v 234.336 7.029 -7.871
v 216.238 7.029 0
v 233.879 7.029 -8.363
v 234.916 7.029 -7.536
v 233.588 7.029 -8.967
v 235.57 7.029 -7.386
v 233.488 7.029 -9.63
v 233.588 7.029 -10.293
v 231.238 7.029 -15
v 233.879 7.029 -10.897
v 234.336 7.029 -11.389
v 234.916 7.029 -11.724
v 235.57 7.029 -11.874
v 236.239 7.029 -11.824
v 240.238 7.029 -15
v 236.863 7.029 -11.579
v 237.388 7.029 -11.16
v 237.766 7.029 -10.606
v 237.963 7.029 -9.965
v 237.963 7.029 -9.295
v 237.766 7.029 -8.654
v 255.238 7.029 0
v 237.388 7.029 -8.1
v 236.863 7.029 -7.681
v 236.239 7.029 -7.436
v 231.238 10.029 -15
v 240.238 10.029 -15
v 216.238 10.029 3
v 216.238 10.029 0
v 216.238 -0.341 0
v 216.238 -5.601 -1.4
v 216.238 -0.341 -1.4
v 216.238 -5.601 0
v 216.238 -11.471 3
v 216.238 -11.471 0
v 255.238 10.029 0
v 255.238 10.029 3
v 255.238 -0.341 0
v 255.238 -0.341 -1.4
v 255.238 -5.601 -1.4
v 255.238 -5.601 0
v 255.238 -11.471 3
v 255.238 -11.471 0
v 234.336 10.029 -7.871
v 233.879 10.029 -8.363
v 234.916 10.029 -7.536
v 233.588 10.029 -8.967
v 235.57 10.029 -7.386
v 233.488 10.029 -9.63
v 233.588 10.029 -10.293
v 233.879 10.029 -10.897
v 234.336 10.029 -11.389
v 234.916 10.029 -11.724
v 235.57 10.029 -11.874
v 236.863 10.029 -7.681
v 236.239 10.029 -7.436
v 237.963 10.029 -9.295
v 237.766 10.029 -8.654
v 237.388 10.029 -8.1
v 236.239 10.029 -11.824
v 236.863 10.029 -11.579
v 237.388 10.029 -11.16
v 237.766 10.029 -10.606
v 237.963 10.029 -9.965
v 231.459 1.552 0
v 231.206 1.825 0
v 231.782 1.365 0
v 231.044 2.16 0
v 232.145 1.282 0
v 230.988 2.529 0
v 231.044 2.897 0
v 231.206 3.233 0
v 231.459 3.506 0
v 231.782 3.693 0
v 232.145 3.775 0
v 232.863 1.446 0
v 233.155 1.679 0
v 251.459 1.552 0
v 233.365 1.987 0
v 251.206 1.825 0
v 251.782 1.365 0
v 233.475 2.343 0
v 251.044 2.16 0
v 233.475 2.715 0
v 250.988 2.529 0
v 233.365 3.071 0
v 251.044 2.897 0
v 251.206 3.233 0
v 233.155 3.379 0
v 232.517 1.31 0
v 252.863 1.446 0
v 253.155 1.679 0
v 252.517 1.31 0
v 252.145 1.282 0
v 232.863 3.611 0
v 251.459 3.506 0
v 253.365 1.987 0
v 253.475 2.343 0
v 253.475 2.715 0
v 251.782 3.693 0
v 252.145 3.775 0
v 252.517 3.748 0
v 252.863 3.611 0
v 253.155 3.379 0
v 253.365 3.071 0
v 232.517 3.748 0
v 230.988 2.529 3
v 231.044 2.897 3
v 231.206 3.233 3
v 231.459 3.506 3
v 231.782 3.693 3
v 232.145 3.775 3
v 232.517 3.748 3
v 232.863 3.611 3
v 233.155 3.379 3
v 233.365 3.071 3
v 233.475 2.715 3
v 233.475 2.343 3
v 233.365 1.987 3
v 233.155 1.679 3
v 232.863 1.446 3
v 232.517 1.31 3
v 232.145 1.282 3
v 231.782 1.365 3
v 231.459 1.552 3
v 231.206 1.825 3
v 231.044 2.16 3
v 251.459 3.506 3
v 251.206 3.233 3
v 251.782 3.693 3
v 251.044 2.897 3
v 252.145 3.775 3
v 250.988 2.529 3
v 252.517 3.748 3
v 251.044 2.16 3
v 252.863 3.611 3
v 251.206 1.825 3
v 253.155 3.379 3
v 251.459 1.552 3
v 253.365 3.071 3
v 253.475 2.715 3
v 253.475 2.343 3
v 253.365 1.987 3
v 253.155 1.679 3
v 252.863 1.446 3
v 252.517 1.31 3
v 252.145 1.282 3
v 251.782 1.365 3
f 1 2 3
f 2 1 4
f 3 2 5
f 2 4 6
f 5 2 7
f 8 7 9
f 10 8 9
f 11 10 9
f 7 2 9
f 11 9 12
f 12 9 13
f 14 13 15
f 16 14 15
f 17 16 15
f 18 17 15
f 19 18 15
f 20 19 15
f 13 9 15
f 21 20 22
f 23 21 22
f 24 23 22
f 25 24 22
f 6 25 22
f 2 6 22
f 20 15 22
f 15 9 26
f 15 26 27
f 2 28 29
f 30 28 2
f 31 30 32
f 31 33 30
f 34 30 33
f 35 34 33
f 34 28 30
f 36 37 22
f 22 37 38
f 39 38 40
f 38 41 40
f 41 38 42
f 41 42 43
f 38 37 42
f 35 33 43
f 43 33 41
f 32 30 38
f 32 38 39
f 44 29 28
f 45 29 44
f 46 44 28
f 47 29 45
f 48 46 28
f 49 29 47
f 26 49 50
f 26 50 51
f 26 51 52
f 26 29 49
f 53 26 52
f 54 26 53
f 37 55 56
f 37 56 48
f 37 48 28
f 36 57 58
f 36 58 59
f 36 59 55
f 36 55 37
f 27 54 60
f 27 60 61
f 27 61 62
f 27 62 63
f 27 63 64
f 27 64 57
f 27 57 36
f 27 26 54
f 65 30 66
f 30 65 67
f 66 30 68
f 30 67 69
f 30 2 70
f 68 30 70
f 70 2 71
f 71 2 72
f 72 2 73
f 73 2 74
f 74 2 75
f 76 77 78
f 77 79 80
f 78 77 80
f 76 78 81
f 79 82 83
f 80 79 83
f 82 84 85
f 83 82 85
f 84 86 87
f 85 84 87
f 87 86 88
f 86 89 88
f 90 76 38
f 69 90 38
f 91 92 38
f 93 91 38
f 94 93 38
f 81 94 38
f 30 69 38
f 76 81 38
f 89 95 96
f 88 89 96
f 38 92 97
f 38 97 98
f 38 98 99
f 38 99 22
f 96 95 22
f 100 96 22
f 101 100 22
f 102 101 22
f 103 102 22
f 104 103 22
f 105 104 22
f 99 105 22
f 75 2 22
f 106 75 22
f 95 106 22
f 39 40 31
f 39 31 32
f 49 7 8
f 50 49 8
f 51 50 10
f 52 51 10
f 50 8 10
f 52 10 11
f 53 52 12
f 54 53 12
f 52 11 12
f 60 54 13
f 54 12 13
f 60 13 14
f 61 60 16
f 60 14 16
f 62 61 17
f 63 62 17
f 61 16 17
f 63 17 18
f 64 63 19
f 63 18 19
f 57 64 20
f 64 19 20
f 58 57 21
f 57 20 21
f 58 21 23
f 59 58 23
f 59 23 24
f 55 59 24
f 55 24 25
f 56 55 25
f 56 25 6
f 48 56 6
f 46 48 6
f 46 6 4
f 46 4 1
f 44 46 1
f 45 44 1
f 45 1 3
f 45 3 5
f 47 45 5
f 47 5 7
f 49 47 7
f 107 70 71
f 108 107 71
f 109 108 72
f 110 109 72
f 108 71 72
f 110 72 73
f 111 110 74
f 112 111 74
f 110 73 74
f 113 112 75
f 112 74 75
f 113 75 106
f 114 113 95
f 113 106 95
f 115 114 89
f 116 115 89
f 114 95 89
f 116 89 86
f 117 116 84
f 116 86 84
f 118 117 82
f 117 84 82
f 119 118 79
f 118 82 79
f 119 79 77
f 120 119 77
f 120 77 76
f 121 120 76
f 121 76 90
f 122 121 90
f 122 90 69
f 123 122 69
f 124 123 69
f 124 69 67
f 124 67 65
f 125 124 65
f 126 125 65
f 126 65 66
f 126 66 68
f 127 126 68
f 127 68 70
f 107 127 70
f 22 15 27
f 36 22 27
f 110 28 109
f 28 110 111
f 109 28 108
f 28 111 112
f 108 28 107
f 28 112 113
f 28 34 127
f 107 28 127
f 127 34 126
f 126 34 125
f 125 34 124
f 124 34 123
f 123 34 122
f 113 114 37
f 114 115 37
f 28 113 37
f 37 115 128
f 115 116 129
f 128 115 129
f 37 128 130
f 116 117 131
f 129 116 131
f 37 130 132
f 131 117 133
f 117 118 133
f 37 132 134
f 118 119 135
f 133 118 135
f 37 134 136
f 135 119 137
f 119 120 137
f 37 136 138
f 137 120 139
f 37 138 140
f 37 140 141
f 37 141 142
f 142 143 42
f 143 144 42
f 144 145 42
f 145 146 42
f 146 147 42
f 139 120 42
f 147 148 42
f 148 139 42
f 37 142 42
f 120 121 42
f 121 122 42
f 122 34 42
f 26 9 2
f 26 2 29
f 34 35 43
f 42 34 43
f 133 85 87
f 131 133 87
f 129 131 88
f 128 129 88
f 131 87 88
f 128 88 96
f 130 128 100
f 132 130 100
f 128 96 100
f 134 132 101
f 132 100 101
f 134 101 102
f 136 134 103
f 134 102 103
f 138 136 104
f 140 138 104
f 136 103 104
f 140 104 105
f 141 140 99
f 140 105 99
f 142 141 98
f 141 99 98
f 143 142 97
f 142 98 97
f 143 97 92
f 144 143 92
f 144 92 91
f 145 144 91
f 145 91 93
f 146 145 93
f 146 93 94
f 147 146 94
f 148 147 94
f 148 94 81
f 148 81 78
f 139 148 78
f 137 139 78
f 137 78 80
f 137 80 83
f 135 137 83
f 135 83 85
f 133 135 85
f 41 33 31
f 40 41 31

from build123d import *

# Parameters (mm, degrees)
ESQUISSE1_W                                   = 39
ESQUISSE1_H                                   = 18.5
BOSS_EXTRU_1_DEPTH                            = 3
ESQUISSE4_W                                   = 1.4
ESQUISSE4_H                                   = 5.26
BOSS_EXTRU_2_DEPTH                            = 39
TROU_POUR_TARAUDAGE_POUR_TROU_TARAUD_M3_D     = 2.5
TROU_POUR_TARAUDAGE_POUR_TROU_TARAUD_M3_DEPTH = 16
ESQUISSE7_W                                   = 39
ESQUISSE7_H                                   = 18
BOSS_EXTRU_3_DEPTH                            = 3
CHANFREIN1_SIZE                               = 15
D_GAGEMENT_M42_D                              = 4.5
D_GAGEMENT_M42_DEPTH                          = 16


with BuildPart() as part:
    # Esquisse1 → Boss.-Extru.1 (new body)
    with BuildSketch(Plane.XY):
        with Locations((235.738481082, -2.221059771)):
            Rectangle(ESQUISSE1_W, ESQUISSE1_H)
    extrude(amount=BOSS_EXTRU_1_DEPTH)

    # Esquisse4 → Boss.-Extru.2 (add)
    with BuildSketch(Plane(origin=(255.238481082, 0, 0), x_dir=(0, 0, -1), z_dir=(1, 0, 0))):
        with Locations((0.7, -2.971059771)):
            Rectangle(ESQUISSE4_W, ESQUISSE4_H)
    extrude(amount=-BOSS_EXTRU_2_DEPTH)

    # Trou pour taraudage pour trou taraudé M31
    with Locations(Plane.XY.offset(3)):
        with Locations((232.238481082, 2.528940229), (252.238481082, 2.528940229)):
            Hole(TROU_POUR_TARAUDAGE_POUR_TROU_TARAUD_M3_D / 2, depth=TROU_POUR_TARAUDAGE_POUR_TROU_TARAUD_M3_DEPTH)

    # Esquisse7 → Boss.-Extru.3 (add)
    with BuildSketch(Plane(origin=(0, 7.028940229, 0), x_dir=(1, 0, 0), z_dir=(0, 1, 0))):
        with Locations((235.738481082, 6)):
            Rectangle(ESQUISSE7_W, ESQUISSE7_H)
    extrude(amount=BOSS_EXTRU_3_DEPTH)

    # Chanfrein1
    chanfrein1_edges = [part.edges().sort_by_distance(p)[0] for p in [
        (216.238481082, 8.528940229, -15),
        (255.238481082, 8.528940229, -15),
    ]]
    chamfer(chanfrein1_edges, length=CHANFREIN1_SIZE)

    # Dégagement M42
    with Locations(Plane(origin=(0, 10.028940229, 0), x_dir=(1, 0, 0), z_dir=(0, 1, 0))):
        with Locations((235.738481082, 9.63)):
            Hole(D_GAGEMENT_M42_D / 2, depth=D_GAGEMENT_M42_DEPTH)


solid = part.part
